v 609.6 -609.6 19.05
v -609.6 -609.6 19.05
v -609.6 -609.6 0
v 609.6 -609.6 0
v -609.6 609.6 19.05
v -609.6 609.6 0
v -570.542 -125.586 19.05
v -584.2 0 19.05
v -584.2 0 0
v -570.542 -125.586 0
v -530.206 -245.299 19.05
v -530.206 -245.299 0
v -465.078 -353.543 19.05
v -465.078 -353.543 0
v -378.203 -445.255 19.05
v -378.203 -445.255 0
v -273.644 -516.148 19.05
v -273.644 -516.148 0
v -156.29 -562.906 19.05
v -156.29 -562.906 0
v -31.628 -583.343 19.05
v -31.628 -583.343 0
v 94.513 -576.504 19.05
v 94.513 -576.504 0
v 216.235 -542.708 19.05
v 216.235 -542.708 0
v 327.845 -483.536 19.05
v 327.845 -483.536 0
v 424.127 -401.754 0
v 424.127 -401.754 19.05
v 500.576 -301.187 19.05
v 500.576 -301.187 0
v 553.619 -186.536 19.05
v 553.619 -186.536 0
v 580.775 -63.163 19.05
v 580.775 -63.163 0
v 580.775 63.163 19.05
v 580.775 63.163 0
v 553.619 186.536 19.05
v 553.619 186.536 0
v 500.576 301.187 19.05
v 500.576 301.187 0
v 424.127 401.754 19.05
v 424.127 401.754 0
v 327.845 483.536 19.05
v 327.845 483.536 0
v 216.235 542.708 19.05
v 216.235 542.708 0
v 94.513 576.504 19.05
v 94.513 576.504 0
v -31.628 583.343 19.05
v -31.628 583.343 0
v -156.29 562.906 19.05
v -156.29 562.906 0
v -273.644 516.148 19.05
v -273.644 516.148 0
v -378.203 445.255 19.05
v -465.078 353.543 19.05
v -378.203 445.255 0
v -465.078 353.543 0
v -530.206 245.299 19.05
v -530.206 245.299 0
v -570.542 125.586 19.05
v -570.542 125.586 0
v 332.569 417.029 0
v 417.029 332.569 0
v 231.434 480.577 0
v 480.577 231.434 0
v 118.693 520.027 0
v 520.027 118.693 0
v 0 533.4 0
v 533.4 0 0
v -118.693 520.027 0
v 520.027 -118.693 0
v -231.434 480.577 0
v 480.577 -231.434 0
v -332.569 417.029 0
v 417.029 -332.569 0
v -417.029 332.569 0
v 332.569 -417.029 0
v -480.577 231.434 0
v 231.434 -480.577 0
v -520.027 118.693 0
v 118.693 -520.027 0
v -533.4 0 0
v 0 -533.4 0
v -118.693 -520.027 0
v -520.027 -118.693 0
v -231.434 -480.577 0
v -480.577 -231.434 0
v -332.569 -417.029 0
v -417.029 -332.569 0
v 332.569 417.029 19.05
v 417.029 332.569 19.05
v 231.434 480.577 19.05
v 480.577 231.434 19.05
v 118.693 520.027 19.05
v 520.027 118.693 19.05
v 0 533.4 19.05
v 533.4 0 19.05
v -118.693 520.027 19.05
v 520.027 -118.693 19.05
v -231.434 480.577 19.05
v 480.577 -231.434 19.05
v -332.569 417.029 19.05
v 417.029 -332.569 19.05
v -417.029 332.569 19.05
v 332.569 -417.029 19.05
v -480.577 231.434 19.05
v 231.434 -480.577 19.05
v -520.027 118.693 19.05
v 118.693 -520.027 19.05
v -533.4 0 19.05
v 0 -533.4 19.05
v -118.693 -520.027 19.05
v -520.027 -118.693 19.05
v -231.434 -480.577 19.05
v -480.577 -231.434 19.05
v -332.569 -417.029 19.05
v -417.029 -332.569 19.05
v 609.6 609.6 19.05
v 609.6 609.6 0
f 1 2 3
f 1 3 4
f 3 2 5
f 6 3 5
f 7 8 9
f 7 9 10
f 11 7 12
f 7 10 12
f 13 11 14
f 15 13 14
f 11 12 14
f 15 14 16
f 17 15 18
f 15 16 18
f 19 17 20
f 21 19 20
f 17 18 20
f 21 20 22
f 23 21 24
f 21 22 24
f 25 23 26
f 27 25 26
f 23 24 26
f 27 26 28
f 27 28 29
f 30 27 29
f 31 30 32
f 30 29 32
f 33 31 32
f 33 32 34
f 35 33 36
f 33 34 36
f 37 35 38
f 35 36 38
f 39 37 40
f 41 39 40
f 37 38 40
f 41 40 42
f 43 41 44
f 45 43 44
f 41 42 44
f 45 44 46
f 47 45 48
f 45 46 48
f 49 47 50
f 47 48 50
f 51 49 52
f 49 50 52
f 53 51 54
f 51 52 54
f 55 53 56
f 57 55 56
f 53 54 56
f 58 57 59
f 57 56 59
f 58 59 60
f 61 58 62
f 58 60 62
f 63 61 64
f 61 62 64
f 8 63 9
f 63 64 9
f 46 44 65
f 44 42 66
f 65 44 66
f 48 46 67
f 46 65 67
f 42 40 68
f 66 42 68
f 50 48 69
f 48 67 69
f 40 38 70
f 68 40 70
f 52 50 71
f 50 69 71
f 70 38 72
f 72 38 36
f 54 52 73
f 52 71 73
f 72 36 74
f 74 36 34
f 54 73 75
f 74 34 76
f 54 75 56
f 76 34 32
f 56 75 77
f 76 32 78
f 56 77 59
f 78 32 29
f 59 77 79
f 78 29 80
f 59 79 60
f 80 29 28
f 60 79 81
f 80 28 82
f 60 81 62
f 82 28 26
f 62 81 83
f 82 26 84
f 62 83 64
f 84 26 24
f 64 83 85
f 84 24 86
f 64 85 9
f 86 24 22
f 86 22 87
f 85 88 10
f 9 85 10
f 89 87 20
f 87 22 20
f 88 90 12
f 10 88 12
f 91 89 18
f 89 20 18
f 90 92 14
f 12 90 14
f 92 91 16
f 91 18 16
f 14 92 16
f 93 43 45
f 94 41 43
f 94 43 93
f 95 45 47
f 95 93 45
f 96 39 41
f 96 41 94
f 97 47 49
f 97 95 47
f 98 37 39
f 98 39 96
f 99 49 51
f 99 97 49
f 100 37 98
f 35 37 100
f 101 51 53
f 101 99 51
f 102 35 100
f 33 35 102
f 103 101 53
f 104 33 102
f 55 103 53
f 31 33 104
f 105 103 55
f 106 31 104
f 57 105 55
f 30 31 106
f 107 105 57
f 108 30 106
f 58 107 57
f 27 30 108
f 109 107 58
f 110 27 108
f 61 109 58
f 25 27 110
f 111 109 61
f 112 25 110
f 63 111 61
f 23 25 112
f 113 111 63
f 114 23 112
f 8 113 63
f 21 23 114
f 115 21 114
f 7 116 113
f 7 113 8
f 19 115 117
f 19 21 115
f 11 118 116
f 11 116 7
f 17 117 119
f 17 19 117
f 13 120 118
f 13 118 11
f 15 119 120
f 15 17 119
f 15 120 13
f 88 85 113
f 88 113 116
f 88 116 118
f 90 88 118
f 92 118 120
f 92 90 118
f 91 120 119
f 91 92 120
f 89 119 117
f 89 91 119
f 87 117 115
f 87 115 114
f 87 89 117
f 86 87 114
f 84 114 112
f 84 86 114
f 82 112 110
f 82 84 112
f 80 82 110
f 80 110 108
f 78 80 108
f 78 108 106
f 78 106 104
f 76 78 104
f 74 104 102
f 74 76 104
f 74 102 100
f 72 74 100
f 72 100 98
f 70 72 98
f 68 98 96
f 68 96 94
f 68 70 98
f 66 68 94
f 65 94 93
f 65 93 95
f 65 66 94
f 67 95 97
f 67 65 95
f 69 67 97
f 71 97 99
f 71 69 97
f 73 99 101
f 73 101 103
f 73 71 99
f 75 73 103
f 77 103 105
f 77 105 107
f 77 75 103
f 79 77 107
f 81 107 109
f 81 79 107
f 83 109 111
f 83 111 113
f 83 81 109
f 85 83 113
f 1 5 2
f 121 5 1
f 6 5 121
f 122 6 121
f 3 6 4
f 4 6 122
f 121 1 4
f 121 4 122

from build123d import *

# Parameters (mm, degrees)
SKETCH2_R           = 584.2
SKETCH2_R_2         = 533.4
BOSS_EXTRUDE1_DEPTH = 19.05
SKETCH3_W           = 1219.2
SKETCH3_H           = 1219.2
STOCK_DEPTH         = 19.05


with BuildPart() as part:
    # Sketch2 → Boss-Extrude1 (new body)
    with BuildSketch(Plane.XY):
        with Locations(Location((0, 0, 0), (0, 0, 180))):
            Circle(SKETCH2_R)
        with Locations(Location((0, 0, 0), (0, 0, 180))):
            Circle(SKETCH2_R_2, mode=Mode.SUBTRACT)
    extrude(amount=BOSS_EXTRUDE1_DEPTH)


with BuildPart() as body_2:
    # Sketch3 → Stock (new body)
    with BuildSketch(Plane.XY.offset(19.05)):
        Rectangle(SKETCH3_W, SKETCH3_H)
    extrude(amount=-STOCK_DEPTH)


solid = Compound([part.part, body_2.part])
